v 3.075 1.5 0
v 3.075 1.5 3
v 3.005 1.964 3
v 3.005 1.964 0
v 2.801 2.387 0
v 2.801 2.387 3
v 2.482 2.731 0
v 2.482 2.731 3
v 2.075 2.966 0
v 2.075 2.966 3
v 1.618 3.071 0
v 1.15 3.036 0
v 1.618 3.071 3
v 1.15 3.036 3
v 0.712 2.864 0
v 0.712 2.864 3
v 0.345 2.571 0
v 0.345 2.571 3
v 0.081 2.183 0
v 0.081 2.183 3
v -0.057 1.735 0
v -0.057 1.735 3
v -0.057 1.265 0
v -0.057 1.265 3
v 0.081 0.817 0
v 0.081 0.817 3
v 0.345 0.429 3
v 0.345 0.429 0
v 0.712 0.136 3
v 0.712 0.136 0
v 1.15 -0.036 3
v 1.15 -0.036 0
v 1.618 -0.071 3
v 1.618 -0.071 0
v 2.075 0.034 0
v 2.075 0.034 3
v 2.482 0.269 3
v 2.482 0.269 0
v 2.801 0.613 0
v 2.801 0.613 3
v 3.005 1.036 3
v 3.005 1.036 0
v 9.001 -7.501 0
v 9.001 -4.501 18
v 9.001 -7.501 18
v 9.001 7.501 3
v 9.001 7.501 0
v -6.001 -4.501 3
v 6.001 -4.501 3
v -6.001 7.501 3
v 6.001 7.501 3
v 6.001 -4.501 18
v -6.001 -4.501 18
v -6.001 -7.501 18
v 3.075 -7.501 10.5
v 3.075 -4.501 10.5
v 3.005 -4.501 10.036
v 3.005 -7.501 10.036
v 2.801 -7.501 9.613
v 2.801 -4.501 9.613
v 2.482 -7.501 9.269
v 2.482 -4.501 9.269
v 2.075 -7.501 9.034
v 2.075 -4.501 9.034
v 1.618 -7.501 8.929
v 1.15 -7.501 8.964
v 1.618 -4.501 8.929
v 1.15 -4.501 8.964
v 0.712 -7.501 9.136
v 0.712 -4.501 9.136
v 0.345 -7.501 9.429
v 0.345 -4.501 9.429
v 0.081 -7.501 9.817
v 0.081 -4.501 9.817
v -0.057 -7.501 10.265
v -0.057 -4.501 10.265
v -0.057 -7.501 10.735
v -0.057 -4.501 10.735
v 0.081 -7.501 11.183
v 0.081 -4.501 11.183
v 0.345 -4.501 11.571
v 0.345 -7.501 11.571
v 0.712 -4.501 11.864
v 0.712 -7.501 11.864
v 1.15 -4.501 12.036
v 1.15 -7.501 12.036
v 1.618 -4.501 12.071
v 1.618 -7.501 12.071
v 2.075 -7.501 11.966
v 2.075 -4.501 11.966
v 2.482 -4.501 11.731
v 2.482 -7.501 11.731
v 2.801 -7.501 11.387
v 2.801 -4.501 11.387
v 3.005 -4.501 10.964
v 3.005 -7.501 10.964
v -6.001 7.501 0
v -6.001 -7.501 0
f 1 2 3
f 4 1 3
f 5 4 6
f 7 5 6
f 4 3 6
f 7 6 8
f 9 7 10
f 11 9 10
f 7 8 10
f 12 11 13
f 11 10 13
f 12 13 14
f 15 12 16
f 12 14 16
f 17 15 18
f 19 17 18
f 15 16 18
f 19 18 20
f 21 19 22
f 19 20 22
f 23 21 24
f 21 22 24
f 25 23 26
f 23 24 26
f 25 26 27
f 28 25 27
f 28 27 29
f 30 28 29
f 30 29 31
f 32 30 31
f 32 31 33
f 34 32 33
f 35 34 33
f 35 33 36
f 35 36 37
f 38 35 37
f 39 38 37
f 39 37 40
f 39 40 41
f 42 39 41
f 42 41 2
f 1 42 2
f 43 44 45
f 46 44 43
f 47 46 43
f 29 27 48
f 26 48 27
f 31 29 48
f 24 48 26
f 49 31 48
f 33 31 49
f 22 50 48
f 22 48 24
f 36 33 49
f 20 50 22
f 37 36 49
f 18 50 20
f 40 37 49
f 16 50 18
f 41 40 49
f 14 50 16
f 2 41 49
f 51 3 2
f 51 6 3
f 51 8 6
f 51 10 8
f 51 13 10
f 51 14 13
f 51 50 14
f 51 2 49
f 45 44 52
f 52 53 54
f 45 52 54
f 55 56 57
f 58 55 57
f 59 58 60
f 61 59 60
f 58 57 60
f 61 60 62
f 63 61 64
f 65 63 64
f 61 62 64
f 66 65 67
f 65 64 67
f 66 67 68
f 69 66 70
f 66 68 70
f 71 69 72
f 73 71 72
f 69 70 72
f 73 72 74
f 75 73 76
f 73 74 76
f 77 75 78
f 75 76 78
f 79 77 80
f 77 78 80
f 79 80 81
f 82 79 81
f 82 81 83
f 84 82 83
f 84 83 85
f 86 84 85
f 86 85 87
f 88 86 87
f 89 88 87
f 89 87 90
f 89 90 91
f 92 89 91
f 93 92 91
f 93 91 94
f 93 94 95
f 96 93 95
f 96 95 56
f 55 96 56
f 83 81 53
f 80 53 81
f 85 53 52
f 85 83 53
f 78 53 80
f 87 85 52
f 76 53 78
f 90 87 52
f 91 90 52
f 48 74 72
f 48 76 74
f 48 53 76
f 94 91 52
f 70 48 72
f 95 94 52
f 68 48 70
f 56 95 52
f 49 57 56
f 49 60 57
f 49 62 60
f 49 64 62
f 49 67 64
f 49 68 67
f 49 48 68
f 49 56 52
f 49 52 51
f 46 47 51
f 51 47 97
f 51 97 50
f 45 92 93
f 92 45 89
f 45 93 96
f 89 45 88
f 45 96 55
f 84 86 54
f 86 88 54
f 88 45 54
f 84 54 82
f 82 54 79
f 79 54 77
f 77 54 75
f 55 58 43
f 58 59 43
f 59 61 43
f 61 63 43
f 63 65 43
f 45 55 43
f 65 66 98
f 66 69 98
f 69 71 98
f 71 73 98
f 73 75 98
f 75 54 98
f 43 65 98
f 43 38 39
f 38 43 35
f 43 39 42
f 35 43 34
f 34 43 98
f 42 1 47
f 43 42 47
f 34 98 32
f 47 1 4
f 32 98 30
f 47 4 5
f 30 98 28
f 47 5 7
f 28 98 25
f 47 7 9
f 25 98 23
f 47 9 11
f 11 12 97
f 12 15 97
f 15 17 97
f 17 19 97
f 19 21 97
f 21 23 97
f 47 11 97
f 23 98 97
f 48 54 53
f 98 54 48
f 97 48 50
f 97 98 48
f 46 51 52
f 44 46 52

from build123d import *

# Parameters (mm, degrees)
BASE_PROFILE_SKETCH_W          = 12.001239904
BASE_PROFILE_SKETCH_H          = 15.00124
BASE_PROFILE_EXTRUDE_DEPTH     = 3
BACK_PROFILE_SKETCH_W          = 12.001239904
BACK_PROFILE_SKETCH_H          = 3
BACK_PROFILE_EXTRUDE_DEPTH     = 15
SIDE_PROFILE_EXTRUDE_DEPTH     = 3
BOTTOM_MOUNTING_HOLE_CUT_REACH = 5
BOTTOM_MOUNTING_HOLE_SKETCH_R  = 1.575
BACK_MOUNTING_HOLE_CUT_REACH   = 5
BACK_MOUNTING_HOLE_SKETCH_R    = 1.575


with BuildPart() as part:
    # Base Profile Sketch → Base Profile Extrude (new body)
    with BuildSketch(Plane.XY):
        Rectangle(BASE_PROFILE_SKETCH_W, BASE_PROFILE_SKETCH_H)
    extrude(amount=BASE_PROFILE_EXTRUDE_DEPTH)

    # Back Profile Sketch → Back Profile Extrude (add)
    with BuildSketch(Plane.XY.offset(3)):
        with Locations((0, -6.00062)):
            Rectangle(BACK_PROFILE_SKETCH_W, BACK_PROFILE_SKETCH_H)
    extrude(amount=BACK_PROFILE_EXTRUDE_DEPTH)

    # Side Profile Sketch → Side Profile Extrude (add)
    with BuildSketch(Plane(origin=(6.000619952, 0, 0), x_dir=(0, 0, -1), z_dir=(1, 0, 0))):
        Polygon((0, -7.50062), (0, 7.50062), (-3, 7.50062), (-18, -4.50062), (-18, -7.50062), align=None)
    extrude(amount=SIDE_PROFILE_EXTRUDE_DEPTH)

    # Bottom Mounting Hole Sketch → Bottom Mounting Hole Cut (cut, up to next)
    with BuildSketch(Plane.XY.offset(3), mode=Mode.PRIVATE) as bottom_mounting_hole_cut_sk1:
        with Locations((1.5, 1.5)):
            Circle(BOTTOM_MOUNTING_HOLE_SKETCH_R)
    bottom_mounting_hole_cut_tool1 = extrude(bottom_mounting_hole_cut_sk1.sketch, amount=-BOTTOM_MOUNTING_HOLE_CUT_REACH, mode=Mode.PRIVATE) & part.part
    add(bottom_mounting_hole_cut_tool1.solids().sort_by_distance((1.5, 1.5, 3))[0], mode=Mode.SUBTRACT)

    # Back Mounting Hole Sketch → Back Mounting Hole Cut (cut, up to next)
    with BuildSketch(Plane(origin=(0, -4.50062, 0), x_dir=(1, 0, 0), z_dir=(0, 1, 0)), mode=Mode.PRIVATE) as back_mounting_hole_cut_sk1:
        with Locations((1.5, -10.5)):
            Circle(BACK_MOUNTING_HOLE_SKETCH_R)
    back_mounting_hole_cut_tool1 = extrude(back_mounting_hole_cut_sk1.sketch, amount=-BACK_MOUNTING_HOLE_CUT_REACH, mode=Mode.PRIVATE) & part.part
    add(back_mounting_hole_cut_tool1.solids().sort_by_distance((1.5, -4.50062, 10.5))[0], mode=Mode.SUBTRACT)


solid = part.part
